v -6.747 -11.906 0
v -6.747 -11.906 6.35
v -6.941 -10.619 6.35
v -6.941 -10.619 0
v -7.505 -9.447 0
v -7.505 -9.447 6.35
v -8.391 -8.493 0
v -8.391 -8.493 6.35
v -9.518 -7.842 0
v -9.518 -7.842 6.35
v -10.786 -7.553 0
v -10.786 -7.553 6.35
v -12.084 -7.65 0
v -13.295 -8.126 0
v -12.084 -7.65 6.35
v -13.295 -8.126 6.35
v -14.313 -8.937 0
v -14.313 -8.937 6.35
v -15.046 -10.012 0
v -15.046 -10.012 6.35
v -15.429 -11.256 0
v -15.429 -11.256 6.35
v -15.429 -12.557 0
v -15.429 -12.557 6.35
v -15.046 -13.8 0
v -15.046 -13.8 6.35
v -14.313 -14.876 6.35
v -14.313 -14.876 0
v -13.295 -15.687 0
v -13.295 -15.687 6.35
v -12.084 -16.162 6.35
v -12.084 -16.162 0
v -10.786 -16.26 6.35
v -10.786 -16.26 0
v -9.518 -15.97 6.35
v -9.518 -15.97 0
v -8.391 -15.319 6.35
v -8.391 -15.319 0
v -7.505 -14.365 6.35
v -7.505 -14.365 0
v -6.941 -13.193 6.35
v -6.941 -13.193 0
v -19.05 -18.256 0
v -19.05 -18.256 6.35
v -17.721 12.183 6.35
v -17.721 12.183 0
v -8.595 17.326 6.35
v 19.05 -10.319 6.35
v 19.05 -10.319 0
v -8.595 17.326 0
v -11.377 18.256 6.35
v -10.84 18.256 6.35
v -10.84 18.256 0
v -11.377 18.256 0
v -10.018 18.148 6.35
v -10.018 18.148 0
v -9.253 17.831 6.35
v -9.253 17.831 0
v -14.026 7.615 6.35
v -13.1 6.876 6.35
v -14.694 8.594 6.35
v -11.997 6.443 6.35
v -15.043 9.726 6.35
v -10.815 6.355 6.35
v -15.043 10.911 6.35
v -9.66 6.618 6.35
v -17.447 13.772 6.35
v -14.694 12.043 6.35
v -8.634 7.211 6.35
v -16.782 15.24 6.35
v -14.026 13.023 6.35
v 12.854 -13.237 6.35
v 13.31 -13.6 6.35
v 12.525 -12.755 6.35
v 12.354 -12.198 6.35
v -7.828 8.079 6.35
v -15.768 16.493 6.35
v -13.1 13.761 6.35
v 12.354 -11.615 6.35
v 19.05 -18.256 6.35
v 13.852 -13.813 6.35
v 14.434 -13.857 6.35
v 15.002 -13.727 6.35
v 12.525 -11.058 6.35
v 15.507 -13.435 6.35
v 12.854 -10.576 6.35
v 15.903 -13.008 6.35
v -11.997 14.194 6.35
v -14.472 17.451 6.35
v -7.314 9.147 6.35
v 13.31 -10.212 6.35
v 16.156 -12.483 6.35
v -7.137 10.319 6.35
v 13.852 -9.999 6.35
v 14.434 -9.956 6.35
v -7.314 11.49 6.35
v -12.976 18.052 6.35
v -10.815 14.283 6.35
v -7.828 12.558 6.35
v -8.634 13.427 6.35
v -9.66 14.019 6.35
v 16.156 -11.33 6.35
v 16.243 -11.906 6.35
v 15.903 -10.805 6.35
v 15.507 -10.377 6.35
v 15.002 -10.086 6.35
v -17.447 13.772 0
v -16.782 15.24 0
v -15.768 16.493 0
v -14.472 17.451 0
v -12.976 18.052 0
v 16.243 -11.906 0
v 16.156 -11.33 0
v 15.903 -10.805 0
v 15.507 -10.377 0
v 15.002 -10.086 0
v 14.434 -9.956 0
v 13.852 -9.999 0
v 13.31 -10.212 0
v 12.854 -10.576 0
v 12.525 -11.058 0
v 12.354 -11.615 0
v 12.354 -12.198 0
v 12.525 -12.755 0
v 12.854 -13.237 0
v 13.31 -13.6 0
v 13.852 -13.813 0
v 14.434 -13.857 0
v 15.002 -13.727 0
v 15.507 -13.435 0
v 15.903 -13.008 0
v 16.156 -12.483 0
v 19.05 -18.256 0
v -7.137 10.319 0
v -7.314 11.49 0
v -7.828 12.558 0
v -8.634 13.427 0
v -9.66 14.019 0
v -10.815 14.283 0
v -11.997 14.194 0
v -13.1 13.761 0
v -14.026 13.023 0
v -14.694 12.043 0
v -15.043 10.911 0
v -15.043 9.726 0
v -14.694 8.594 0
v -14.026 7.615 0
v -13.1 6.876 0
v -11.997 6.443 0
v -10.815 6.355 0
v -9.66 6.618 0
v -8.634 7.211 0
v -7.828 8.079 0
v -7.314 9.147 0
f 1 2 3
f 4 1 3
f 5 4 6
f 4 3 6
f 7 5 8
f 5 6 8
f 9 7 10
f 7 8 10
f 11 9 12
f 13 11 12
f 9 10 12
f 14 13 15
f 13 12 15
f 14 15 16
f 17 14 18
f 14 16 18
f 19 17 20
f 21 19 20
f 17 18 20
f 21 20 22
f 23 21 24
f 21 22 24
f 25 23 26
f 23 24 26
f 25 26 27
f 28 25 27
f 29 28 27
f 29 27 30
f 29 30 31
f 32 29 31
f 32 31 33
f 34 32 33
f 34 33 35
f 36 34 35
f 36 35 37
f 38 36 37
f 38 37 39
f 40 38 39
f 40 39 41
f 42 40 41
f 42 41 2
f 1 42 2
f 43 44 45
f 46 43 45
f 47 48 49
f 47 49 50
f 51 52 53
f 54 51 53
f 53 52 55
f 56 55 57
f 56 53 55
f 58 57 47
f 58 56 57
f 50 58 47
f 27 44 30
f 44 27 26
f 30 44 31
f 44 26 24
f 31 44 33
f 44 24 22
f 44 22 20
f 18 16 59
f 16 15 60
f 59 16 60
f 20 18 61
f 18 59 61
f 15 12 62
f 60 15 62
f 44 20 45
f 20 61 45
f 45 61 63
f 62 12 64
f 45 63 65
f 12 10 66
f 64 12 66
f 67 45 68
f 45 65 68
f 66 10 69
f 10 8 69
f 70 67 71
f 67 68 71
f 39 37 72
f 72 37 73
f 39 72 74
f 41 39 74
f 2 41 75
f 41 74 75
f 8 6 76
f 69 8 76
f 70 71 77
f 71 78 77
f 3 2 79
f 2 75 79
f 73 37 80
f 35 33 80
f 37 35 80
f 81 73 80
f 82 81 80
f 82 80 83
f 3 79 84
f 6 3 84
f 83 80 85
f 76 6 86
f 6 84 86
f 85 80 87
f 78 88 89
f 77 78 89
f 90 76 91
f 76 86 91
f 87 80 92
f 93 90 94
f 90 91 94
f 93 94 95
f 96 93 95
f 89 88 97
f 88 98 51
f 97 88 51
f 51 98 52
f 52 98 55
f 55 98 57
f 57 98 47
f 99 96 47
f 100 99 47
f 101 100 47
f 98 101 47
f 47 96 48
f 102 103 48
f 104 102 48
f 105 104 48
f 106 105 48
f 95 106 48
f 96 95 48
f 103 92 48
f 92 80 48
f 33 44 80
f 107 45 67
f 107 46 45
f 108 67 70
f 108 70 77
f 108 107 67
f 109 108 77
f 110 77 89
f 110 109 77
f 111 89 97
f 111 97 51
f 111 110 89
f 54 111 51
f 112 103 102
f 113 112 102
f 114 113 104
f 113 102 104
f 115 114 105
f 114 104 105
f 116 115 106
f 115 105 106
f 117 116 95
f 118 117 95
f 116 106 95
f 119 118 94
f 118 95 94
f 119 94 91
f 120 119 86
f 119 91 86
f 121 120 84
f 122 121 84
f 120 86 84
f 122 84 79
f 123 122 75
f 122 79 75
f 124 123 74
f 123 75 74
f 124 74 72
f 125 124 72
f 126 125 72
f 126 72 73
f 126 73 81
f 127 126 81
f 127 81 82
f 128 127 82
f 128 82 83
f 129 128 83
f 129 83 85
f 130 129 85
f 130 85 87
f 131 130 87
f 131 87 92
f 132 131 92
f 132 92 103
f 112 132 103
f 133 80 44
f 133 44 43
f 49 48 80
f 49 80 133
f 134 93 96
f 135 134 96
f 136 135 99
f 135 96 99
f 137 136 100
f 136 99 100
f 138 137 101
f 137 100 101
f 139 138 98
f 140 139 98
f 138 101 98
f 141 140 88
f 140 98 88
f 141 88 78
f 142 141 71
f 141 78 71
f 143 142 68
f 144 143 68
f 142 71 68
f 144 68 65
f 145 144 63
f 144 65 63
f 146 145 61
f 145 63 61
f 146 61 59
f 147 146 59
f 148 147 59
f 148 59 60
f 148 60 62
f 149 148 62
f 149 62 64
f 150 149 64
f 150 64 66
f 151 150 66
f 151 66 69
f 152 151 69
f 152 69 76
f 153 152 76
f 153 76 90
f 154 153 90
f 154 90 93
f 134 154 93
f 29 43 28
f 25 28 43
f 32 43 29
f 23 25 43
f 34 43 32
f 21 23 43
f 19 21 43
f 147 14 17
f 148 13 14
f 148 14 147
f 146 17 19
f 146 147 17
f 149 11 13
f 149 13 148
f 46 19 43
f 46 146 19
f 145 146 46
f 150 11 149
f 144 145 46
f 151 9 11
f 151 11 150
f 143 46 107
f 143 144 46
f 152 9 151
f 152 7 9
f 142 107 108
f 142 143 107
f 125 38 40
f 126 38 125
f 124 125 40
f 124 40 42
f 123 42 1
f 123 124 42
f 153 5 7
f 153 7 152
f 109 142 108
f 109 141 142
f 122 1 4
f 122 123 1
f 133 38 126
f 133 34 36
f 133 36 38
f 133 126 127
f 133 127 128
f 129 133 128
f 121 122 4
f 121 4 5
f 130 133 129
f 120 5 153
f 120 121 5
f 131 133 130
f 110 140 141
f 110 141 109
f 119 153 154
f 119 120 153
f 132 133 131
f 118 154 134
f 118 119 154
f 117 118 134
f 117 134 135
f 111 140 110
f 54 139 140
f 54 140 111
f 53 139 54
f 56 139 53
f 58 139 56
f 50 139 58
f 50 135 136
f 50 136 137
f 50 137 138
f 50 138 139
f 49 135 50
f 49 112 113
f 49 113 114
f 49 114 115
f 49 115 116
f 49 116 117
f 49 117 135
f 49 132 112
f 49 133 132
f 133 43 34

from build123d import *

# Parameters (mm, degrees)
SKETCH1_W          = 6.35
SKETCH1_H          = 36.5125
BASE_FLANGE1_DEPTH = 19.05
CUT_EXTRUDE1_REACH = 29.139
CUT_EXTRUDE2_REACH = 29.139
SKETCH4_R          = 4.365625
SKETCH4_R_2        = 1.9558
SKETCH4_R_3        = 3.9751
FILLET1_R          = 6.35
FILLET2_R          = 3.175


# Sheet-metal steps are written as plain solids
with BuildPart() as part:
    # Sketch1 → Base-Flange1 (new, symmetric)
    with BuildSketch(Plane(origin=(0, 0, 0), x_dir=(0, 0, -1), z_dir=(1, 0, 0))):
        with Locations((-3.175, 0)):
            Rectangle(SKETCH1_W, SKETCH1_H)
    extrude(amount=BASE_FLANGE1_DEPTH, both=True)

    # Sketch3 → Cut-Extrude1 (cut, up to next)
    with BuildSketch(Plane.XY.offset(6.35), mode=Mode.PRIVATE) as cut_extrude1_sk1:
        Polygon((-19.05, 18.25625), (-19.05, -18.25625), (-17.455829822, 18.25625), align=None)
    cut_extrude1_tool1 = extrude(cut_extrude1_sk1.sketch, amount=-CUT_EXTRUDE1_REACH, mode=Mode.PRIVATE) & part.part
    # Sketch3 → Cut-Extrude1 (cut, up to next)
    with BuildSketch(Plane.XY.offset(6.35), mode=Mode.PRIVATE) as cut_extrude1_sk2:
        Polygon((19.05, 18.25625), (19.05, -10.31875), (-9.525, 18.25625), align=None)
    cut_extrude1_tool2 = extrude(cut_extrude1_sk2.sketch, amount=-CUT_EXTRUDE1_REACH, mode=Mode.PRIVATE) & part.part
    add(cut_extrude1_tool1.solids().sort_by_distance((-18.51861, 6.085417, 6.35))[0], mode=Mode.SUBTRACT)
    add(cut_extrude1_tool2.solids().sort_by_distance((9.525, 8.73125, 6.35))[0], mode=Mode.SUBTRACT)

    # Sketch4 → Cut-Extrude2 (cut, up to next)
    with BuildSketch(Plane.XY.offset(6.35), mode=Mode.PRIVATE) as cut_extrude2_sk1:
        with Locations((-11.1125, -11.90625)):
            Circle(SKETCH4_R)
    cut_extrude2_tool1 = extrude(cut_extrude2_sk1.sketch, amount=-CUT_EXTRUDE2_REACH, mode=Mode.PRIVATE) & part.part
    # Sketch4 → Cut-Extrude2 (cut, up to next)
    with BuildSketch(Plane.XY.offset(6.35), mode=Mode.PRIVATE) as cut_extrude2_sk2:
        with Locations((14.2875, -11.90625)):
            Circle(SKETCH4_R_2)
    cut_extrude2_tool2 = extrude(cut_extrude2_sk2.sketch, amount=-CUT_EXTRUDE2_REACH, mode=Mode.PRIVATE) & part.part
    # Sketch4 → Cut-Extrude2 (cut, up to next)
    with BuildSketch(Plane.XY.offset(6.35), mode=Mode.PRIVATE) as cut_extrude2_sk3:
        with Locations((-11.1125, 10.31875)):
            Circle(SKETCH4_R_3)
    cut_extrude2_tool3 = extrude(cut_extrude2_sk3.sketch, amount=-CUT_EXTRUDE2_REACH, mode=Mode.PRIVATE) & part.part
    add(cut_extrude2_tool1.solids().sort_by_distance((-11.1125, -11.90625, 6.35))[0], mode=Mode.SUBTRACT)
    add(cut_extrude2_tool2.solids().sort_by_distance((14.2875, -11.90625, 6.35))[0], mode=Mode.SUBTRACT)
    add(cut_extrude2_tool3.solids().sort_by_distance((-11.1125, 10.31875, 6.35))[0], mode=Mode.SUBTRACT)

    # Fillet1
    fillet1_edges = [part.edges().sort_by_distance(p)[0] for p in [
        (-17.455829822, 18.25625, 3.175),
    ]]
    fillet(fillet1_edges, radius=FILLET1_R)

    # Fillet2
    fillet2_edges = [part.edges().sort_by_distance(p)[0] for p in [
        (-9.525, 18.25625, 3.175),
    ]]
    fillet(fillet2_edges, radius=FILLET2_R)


solid = part.part
